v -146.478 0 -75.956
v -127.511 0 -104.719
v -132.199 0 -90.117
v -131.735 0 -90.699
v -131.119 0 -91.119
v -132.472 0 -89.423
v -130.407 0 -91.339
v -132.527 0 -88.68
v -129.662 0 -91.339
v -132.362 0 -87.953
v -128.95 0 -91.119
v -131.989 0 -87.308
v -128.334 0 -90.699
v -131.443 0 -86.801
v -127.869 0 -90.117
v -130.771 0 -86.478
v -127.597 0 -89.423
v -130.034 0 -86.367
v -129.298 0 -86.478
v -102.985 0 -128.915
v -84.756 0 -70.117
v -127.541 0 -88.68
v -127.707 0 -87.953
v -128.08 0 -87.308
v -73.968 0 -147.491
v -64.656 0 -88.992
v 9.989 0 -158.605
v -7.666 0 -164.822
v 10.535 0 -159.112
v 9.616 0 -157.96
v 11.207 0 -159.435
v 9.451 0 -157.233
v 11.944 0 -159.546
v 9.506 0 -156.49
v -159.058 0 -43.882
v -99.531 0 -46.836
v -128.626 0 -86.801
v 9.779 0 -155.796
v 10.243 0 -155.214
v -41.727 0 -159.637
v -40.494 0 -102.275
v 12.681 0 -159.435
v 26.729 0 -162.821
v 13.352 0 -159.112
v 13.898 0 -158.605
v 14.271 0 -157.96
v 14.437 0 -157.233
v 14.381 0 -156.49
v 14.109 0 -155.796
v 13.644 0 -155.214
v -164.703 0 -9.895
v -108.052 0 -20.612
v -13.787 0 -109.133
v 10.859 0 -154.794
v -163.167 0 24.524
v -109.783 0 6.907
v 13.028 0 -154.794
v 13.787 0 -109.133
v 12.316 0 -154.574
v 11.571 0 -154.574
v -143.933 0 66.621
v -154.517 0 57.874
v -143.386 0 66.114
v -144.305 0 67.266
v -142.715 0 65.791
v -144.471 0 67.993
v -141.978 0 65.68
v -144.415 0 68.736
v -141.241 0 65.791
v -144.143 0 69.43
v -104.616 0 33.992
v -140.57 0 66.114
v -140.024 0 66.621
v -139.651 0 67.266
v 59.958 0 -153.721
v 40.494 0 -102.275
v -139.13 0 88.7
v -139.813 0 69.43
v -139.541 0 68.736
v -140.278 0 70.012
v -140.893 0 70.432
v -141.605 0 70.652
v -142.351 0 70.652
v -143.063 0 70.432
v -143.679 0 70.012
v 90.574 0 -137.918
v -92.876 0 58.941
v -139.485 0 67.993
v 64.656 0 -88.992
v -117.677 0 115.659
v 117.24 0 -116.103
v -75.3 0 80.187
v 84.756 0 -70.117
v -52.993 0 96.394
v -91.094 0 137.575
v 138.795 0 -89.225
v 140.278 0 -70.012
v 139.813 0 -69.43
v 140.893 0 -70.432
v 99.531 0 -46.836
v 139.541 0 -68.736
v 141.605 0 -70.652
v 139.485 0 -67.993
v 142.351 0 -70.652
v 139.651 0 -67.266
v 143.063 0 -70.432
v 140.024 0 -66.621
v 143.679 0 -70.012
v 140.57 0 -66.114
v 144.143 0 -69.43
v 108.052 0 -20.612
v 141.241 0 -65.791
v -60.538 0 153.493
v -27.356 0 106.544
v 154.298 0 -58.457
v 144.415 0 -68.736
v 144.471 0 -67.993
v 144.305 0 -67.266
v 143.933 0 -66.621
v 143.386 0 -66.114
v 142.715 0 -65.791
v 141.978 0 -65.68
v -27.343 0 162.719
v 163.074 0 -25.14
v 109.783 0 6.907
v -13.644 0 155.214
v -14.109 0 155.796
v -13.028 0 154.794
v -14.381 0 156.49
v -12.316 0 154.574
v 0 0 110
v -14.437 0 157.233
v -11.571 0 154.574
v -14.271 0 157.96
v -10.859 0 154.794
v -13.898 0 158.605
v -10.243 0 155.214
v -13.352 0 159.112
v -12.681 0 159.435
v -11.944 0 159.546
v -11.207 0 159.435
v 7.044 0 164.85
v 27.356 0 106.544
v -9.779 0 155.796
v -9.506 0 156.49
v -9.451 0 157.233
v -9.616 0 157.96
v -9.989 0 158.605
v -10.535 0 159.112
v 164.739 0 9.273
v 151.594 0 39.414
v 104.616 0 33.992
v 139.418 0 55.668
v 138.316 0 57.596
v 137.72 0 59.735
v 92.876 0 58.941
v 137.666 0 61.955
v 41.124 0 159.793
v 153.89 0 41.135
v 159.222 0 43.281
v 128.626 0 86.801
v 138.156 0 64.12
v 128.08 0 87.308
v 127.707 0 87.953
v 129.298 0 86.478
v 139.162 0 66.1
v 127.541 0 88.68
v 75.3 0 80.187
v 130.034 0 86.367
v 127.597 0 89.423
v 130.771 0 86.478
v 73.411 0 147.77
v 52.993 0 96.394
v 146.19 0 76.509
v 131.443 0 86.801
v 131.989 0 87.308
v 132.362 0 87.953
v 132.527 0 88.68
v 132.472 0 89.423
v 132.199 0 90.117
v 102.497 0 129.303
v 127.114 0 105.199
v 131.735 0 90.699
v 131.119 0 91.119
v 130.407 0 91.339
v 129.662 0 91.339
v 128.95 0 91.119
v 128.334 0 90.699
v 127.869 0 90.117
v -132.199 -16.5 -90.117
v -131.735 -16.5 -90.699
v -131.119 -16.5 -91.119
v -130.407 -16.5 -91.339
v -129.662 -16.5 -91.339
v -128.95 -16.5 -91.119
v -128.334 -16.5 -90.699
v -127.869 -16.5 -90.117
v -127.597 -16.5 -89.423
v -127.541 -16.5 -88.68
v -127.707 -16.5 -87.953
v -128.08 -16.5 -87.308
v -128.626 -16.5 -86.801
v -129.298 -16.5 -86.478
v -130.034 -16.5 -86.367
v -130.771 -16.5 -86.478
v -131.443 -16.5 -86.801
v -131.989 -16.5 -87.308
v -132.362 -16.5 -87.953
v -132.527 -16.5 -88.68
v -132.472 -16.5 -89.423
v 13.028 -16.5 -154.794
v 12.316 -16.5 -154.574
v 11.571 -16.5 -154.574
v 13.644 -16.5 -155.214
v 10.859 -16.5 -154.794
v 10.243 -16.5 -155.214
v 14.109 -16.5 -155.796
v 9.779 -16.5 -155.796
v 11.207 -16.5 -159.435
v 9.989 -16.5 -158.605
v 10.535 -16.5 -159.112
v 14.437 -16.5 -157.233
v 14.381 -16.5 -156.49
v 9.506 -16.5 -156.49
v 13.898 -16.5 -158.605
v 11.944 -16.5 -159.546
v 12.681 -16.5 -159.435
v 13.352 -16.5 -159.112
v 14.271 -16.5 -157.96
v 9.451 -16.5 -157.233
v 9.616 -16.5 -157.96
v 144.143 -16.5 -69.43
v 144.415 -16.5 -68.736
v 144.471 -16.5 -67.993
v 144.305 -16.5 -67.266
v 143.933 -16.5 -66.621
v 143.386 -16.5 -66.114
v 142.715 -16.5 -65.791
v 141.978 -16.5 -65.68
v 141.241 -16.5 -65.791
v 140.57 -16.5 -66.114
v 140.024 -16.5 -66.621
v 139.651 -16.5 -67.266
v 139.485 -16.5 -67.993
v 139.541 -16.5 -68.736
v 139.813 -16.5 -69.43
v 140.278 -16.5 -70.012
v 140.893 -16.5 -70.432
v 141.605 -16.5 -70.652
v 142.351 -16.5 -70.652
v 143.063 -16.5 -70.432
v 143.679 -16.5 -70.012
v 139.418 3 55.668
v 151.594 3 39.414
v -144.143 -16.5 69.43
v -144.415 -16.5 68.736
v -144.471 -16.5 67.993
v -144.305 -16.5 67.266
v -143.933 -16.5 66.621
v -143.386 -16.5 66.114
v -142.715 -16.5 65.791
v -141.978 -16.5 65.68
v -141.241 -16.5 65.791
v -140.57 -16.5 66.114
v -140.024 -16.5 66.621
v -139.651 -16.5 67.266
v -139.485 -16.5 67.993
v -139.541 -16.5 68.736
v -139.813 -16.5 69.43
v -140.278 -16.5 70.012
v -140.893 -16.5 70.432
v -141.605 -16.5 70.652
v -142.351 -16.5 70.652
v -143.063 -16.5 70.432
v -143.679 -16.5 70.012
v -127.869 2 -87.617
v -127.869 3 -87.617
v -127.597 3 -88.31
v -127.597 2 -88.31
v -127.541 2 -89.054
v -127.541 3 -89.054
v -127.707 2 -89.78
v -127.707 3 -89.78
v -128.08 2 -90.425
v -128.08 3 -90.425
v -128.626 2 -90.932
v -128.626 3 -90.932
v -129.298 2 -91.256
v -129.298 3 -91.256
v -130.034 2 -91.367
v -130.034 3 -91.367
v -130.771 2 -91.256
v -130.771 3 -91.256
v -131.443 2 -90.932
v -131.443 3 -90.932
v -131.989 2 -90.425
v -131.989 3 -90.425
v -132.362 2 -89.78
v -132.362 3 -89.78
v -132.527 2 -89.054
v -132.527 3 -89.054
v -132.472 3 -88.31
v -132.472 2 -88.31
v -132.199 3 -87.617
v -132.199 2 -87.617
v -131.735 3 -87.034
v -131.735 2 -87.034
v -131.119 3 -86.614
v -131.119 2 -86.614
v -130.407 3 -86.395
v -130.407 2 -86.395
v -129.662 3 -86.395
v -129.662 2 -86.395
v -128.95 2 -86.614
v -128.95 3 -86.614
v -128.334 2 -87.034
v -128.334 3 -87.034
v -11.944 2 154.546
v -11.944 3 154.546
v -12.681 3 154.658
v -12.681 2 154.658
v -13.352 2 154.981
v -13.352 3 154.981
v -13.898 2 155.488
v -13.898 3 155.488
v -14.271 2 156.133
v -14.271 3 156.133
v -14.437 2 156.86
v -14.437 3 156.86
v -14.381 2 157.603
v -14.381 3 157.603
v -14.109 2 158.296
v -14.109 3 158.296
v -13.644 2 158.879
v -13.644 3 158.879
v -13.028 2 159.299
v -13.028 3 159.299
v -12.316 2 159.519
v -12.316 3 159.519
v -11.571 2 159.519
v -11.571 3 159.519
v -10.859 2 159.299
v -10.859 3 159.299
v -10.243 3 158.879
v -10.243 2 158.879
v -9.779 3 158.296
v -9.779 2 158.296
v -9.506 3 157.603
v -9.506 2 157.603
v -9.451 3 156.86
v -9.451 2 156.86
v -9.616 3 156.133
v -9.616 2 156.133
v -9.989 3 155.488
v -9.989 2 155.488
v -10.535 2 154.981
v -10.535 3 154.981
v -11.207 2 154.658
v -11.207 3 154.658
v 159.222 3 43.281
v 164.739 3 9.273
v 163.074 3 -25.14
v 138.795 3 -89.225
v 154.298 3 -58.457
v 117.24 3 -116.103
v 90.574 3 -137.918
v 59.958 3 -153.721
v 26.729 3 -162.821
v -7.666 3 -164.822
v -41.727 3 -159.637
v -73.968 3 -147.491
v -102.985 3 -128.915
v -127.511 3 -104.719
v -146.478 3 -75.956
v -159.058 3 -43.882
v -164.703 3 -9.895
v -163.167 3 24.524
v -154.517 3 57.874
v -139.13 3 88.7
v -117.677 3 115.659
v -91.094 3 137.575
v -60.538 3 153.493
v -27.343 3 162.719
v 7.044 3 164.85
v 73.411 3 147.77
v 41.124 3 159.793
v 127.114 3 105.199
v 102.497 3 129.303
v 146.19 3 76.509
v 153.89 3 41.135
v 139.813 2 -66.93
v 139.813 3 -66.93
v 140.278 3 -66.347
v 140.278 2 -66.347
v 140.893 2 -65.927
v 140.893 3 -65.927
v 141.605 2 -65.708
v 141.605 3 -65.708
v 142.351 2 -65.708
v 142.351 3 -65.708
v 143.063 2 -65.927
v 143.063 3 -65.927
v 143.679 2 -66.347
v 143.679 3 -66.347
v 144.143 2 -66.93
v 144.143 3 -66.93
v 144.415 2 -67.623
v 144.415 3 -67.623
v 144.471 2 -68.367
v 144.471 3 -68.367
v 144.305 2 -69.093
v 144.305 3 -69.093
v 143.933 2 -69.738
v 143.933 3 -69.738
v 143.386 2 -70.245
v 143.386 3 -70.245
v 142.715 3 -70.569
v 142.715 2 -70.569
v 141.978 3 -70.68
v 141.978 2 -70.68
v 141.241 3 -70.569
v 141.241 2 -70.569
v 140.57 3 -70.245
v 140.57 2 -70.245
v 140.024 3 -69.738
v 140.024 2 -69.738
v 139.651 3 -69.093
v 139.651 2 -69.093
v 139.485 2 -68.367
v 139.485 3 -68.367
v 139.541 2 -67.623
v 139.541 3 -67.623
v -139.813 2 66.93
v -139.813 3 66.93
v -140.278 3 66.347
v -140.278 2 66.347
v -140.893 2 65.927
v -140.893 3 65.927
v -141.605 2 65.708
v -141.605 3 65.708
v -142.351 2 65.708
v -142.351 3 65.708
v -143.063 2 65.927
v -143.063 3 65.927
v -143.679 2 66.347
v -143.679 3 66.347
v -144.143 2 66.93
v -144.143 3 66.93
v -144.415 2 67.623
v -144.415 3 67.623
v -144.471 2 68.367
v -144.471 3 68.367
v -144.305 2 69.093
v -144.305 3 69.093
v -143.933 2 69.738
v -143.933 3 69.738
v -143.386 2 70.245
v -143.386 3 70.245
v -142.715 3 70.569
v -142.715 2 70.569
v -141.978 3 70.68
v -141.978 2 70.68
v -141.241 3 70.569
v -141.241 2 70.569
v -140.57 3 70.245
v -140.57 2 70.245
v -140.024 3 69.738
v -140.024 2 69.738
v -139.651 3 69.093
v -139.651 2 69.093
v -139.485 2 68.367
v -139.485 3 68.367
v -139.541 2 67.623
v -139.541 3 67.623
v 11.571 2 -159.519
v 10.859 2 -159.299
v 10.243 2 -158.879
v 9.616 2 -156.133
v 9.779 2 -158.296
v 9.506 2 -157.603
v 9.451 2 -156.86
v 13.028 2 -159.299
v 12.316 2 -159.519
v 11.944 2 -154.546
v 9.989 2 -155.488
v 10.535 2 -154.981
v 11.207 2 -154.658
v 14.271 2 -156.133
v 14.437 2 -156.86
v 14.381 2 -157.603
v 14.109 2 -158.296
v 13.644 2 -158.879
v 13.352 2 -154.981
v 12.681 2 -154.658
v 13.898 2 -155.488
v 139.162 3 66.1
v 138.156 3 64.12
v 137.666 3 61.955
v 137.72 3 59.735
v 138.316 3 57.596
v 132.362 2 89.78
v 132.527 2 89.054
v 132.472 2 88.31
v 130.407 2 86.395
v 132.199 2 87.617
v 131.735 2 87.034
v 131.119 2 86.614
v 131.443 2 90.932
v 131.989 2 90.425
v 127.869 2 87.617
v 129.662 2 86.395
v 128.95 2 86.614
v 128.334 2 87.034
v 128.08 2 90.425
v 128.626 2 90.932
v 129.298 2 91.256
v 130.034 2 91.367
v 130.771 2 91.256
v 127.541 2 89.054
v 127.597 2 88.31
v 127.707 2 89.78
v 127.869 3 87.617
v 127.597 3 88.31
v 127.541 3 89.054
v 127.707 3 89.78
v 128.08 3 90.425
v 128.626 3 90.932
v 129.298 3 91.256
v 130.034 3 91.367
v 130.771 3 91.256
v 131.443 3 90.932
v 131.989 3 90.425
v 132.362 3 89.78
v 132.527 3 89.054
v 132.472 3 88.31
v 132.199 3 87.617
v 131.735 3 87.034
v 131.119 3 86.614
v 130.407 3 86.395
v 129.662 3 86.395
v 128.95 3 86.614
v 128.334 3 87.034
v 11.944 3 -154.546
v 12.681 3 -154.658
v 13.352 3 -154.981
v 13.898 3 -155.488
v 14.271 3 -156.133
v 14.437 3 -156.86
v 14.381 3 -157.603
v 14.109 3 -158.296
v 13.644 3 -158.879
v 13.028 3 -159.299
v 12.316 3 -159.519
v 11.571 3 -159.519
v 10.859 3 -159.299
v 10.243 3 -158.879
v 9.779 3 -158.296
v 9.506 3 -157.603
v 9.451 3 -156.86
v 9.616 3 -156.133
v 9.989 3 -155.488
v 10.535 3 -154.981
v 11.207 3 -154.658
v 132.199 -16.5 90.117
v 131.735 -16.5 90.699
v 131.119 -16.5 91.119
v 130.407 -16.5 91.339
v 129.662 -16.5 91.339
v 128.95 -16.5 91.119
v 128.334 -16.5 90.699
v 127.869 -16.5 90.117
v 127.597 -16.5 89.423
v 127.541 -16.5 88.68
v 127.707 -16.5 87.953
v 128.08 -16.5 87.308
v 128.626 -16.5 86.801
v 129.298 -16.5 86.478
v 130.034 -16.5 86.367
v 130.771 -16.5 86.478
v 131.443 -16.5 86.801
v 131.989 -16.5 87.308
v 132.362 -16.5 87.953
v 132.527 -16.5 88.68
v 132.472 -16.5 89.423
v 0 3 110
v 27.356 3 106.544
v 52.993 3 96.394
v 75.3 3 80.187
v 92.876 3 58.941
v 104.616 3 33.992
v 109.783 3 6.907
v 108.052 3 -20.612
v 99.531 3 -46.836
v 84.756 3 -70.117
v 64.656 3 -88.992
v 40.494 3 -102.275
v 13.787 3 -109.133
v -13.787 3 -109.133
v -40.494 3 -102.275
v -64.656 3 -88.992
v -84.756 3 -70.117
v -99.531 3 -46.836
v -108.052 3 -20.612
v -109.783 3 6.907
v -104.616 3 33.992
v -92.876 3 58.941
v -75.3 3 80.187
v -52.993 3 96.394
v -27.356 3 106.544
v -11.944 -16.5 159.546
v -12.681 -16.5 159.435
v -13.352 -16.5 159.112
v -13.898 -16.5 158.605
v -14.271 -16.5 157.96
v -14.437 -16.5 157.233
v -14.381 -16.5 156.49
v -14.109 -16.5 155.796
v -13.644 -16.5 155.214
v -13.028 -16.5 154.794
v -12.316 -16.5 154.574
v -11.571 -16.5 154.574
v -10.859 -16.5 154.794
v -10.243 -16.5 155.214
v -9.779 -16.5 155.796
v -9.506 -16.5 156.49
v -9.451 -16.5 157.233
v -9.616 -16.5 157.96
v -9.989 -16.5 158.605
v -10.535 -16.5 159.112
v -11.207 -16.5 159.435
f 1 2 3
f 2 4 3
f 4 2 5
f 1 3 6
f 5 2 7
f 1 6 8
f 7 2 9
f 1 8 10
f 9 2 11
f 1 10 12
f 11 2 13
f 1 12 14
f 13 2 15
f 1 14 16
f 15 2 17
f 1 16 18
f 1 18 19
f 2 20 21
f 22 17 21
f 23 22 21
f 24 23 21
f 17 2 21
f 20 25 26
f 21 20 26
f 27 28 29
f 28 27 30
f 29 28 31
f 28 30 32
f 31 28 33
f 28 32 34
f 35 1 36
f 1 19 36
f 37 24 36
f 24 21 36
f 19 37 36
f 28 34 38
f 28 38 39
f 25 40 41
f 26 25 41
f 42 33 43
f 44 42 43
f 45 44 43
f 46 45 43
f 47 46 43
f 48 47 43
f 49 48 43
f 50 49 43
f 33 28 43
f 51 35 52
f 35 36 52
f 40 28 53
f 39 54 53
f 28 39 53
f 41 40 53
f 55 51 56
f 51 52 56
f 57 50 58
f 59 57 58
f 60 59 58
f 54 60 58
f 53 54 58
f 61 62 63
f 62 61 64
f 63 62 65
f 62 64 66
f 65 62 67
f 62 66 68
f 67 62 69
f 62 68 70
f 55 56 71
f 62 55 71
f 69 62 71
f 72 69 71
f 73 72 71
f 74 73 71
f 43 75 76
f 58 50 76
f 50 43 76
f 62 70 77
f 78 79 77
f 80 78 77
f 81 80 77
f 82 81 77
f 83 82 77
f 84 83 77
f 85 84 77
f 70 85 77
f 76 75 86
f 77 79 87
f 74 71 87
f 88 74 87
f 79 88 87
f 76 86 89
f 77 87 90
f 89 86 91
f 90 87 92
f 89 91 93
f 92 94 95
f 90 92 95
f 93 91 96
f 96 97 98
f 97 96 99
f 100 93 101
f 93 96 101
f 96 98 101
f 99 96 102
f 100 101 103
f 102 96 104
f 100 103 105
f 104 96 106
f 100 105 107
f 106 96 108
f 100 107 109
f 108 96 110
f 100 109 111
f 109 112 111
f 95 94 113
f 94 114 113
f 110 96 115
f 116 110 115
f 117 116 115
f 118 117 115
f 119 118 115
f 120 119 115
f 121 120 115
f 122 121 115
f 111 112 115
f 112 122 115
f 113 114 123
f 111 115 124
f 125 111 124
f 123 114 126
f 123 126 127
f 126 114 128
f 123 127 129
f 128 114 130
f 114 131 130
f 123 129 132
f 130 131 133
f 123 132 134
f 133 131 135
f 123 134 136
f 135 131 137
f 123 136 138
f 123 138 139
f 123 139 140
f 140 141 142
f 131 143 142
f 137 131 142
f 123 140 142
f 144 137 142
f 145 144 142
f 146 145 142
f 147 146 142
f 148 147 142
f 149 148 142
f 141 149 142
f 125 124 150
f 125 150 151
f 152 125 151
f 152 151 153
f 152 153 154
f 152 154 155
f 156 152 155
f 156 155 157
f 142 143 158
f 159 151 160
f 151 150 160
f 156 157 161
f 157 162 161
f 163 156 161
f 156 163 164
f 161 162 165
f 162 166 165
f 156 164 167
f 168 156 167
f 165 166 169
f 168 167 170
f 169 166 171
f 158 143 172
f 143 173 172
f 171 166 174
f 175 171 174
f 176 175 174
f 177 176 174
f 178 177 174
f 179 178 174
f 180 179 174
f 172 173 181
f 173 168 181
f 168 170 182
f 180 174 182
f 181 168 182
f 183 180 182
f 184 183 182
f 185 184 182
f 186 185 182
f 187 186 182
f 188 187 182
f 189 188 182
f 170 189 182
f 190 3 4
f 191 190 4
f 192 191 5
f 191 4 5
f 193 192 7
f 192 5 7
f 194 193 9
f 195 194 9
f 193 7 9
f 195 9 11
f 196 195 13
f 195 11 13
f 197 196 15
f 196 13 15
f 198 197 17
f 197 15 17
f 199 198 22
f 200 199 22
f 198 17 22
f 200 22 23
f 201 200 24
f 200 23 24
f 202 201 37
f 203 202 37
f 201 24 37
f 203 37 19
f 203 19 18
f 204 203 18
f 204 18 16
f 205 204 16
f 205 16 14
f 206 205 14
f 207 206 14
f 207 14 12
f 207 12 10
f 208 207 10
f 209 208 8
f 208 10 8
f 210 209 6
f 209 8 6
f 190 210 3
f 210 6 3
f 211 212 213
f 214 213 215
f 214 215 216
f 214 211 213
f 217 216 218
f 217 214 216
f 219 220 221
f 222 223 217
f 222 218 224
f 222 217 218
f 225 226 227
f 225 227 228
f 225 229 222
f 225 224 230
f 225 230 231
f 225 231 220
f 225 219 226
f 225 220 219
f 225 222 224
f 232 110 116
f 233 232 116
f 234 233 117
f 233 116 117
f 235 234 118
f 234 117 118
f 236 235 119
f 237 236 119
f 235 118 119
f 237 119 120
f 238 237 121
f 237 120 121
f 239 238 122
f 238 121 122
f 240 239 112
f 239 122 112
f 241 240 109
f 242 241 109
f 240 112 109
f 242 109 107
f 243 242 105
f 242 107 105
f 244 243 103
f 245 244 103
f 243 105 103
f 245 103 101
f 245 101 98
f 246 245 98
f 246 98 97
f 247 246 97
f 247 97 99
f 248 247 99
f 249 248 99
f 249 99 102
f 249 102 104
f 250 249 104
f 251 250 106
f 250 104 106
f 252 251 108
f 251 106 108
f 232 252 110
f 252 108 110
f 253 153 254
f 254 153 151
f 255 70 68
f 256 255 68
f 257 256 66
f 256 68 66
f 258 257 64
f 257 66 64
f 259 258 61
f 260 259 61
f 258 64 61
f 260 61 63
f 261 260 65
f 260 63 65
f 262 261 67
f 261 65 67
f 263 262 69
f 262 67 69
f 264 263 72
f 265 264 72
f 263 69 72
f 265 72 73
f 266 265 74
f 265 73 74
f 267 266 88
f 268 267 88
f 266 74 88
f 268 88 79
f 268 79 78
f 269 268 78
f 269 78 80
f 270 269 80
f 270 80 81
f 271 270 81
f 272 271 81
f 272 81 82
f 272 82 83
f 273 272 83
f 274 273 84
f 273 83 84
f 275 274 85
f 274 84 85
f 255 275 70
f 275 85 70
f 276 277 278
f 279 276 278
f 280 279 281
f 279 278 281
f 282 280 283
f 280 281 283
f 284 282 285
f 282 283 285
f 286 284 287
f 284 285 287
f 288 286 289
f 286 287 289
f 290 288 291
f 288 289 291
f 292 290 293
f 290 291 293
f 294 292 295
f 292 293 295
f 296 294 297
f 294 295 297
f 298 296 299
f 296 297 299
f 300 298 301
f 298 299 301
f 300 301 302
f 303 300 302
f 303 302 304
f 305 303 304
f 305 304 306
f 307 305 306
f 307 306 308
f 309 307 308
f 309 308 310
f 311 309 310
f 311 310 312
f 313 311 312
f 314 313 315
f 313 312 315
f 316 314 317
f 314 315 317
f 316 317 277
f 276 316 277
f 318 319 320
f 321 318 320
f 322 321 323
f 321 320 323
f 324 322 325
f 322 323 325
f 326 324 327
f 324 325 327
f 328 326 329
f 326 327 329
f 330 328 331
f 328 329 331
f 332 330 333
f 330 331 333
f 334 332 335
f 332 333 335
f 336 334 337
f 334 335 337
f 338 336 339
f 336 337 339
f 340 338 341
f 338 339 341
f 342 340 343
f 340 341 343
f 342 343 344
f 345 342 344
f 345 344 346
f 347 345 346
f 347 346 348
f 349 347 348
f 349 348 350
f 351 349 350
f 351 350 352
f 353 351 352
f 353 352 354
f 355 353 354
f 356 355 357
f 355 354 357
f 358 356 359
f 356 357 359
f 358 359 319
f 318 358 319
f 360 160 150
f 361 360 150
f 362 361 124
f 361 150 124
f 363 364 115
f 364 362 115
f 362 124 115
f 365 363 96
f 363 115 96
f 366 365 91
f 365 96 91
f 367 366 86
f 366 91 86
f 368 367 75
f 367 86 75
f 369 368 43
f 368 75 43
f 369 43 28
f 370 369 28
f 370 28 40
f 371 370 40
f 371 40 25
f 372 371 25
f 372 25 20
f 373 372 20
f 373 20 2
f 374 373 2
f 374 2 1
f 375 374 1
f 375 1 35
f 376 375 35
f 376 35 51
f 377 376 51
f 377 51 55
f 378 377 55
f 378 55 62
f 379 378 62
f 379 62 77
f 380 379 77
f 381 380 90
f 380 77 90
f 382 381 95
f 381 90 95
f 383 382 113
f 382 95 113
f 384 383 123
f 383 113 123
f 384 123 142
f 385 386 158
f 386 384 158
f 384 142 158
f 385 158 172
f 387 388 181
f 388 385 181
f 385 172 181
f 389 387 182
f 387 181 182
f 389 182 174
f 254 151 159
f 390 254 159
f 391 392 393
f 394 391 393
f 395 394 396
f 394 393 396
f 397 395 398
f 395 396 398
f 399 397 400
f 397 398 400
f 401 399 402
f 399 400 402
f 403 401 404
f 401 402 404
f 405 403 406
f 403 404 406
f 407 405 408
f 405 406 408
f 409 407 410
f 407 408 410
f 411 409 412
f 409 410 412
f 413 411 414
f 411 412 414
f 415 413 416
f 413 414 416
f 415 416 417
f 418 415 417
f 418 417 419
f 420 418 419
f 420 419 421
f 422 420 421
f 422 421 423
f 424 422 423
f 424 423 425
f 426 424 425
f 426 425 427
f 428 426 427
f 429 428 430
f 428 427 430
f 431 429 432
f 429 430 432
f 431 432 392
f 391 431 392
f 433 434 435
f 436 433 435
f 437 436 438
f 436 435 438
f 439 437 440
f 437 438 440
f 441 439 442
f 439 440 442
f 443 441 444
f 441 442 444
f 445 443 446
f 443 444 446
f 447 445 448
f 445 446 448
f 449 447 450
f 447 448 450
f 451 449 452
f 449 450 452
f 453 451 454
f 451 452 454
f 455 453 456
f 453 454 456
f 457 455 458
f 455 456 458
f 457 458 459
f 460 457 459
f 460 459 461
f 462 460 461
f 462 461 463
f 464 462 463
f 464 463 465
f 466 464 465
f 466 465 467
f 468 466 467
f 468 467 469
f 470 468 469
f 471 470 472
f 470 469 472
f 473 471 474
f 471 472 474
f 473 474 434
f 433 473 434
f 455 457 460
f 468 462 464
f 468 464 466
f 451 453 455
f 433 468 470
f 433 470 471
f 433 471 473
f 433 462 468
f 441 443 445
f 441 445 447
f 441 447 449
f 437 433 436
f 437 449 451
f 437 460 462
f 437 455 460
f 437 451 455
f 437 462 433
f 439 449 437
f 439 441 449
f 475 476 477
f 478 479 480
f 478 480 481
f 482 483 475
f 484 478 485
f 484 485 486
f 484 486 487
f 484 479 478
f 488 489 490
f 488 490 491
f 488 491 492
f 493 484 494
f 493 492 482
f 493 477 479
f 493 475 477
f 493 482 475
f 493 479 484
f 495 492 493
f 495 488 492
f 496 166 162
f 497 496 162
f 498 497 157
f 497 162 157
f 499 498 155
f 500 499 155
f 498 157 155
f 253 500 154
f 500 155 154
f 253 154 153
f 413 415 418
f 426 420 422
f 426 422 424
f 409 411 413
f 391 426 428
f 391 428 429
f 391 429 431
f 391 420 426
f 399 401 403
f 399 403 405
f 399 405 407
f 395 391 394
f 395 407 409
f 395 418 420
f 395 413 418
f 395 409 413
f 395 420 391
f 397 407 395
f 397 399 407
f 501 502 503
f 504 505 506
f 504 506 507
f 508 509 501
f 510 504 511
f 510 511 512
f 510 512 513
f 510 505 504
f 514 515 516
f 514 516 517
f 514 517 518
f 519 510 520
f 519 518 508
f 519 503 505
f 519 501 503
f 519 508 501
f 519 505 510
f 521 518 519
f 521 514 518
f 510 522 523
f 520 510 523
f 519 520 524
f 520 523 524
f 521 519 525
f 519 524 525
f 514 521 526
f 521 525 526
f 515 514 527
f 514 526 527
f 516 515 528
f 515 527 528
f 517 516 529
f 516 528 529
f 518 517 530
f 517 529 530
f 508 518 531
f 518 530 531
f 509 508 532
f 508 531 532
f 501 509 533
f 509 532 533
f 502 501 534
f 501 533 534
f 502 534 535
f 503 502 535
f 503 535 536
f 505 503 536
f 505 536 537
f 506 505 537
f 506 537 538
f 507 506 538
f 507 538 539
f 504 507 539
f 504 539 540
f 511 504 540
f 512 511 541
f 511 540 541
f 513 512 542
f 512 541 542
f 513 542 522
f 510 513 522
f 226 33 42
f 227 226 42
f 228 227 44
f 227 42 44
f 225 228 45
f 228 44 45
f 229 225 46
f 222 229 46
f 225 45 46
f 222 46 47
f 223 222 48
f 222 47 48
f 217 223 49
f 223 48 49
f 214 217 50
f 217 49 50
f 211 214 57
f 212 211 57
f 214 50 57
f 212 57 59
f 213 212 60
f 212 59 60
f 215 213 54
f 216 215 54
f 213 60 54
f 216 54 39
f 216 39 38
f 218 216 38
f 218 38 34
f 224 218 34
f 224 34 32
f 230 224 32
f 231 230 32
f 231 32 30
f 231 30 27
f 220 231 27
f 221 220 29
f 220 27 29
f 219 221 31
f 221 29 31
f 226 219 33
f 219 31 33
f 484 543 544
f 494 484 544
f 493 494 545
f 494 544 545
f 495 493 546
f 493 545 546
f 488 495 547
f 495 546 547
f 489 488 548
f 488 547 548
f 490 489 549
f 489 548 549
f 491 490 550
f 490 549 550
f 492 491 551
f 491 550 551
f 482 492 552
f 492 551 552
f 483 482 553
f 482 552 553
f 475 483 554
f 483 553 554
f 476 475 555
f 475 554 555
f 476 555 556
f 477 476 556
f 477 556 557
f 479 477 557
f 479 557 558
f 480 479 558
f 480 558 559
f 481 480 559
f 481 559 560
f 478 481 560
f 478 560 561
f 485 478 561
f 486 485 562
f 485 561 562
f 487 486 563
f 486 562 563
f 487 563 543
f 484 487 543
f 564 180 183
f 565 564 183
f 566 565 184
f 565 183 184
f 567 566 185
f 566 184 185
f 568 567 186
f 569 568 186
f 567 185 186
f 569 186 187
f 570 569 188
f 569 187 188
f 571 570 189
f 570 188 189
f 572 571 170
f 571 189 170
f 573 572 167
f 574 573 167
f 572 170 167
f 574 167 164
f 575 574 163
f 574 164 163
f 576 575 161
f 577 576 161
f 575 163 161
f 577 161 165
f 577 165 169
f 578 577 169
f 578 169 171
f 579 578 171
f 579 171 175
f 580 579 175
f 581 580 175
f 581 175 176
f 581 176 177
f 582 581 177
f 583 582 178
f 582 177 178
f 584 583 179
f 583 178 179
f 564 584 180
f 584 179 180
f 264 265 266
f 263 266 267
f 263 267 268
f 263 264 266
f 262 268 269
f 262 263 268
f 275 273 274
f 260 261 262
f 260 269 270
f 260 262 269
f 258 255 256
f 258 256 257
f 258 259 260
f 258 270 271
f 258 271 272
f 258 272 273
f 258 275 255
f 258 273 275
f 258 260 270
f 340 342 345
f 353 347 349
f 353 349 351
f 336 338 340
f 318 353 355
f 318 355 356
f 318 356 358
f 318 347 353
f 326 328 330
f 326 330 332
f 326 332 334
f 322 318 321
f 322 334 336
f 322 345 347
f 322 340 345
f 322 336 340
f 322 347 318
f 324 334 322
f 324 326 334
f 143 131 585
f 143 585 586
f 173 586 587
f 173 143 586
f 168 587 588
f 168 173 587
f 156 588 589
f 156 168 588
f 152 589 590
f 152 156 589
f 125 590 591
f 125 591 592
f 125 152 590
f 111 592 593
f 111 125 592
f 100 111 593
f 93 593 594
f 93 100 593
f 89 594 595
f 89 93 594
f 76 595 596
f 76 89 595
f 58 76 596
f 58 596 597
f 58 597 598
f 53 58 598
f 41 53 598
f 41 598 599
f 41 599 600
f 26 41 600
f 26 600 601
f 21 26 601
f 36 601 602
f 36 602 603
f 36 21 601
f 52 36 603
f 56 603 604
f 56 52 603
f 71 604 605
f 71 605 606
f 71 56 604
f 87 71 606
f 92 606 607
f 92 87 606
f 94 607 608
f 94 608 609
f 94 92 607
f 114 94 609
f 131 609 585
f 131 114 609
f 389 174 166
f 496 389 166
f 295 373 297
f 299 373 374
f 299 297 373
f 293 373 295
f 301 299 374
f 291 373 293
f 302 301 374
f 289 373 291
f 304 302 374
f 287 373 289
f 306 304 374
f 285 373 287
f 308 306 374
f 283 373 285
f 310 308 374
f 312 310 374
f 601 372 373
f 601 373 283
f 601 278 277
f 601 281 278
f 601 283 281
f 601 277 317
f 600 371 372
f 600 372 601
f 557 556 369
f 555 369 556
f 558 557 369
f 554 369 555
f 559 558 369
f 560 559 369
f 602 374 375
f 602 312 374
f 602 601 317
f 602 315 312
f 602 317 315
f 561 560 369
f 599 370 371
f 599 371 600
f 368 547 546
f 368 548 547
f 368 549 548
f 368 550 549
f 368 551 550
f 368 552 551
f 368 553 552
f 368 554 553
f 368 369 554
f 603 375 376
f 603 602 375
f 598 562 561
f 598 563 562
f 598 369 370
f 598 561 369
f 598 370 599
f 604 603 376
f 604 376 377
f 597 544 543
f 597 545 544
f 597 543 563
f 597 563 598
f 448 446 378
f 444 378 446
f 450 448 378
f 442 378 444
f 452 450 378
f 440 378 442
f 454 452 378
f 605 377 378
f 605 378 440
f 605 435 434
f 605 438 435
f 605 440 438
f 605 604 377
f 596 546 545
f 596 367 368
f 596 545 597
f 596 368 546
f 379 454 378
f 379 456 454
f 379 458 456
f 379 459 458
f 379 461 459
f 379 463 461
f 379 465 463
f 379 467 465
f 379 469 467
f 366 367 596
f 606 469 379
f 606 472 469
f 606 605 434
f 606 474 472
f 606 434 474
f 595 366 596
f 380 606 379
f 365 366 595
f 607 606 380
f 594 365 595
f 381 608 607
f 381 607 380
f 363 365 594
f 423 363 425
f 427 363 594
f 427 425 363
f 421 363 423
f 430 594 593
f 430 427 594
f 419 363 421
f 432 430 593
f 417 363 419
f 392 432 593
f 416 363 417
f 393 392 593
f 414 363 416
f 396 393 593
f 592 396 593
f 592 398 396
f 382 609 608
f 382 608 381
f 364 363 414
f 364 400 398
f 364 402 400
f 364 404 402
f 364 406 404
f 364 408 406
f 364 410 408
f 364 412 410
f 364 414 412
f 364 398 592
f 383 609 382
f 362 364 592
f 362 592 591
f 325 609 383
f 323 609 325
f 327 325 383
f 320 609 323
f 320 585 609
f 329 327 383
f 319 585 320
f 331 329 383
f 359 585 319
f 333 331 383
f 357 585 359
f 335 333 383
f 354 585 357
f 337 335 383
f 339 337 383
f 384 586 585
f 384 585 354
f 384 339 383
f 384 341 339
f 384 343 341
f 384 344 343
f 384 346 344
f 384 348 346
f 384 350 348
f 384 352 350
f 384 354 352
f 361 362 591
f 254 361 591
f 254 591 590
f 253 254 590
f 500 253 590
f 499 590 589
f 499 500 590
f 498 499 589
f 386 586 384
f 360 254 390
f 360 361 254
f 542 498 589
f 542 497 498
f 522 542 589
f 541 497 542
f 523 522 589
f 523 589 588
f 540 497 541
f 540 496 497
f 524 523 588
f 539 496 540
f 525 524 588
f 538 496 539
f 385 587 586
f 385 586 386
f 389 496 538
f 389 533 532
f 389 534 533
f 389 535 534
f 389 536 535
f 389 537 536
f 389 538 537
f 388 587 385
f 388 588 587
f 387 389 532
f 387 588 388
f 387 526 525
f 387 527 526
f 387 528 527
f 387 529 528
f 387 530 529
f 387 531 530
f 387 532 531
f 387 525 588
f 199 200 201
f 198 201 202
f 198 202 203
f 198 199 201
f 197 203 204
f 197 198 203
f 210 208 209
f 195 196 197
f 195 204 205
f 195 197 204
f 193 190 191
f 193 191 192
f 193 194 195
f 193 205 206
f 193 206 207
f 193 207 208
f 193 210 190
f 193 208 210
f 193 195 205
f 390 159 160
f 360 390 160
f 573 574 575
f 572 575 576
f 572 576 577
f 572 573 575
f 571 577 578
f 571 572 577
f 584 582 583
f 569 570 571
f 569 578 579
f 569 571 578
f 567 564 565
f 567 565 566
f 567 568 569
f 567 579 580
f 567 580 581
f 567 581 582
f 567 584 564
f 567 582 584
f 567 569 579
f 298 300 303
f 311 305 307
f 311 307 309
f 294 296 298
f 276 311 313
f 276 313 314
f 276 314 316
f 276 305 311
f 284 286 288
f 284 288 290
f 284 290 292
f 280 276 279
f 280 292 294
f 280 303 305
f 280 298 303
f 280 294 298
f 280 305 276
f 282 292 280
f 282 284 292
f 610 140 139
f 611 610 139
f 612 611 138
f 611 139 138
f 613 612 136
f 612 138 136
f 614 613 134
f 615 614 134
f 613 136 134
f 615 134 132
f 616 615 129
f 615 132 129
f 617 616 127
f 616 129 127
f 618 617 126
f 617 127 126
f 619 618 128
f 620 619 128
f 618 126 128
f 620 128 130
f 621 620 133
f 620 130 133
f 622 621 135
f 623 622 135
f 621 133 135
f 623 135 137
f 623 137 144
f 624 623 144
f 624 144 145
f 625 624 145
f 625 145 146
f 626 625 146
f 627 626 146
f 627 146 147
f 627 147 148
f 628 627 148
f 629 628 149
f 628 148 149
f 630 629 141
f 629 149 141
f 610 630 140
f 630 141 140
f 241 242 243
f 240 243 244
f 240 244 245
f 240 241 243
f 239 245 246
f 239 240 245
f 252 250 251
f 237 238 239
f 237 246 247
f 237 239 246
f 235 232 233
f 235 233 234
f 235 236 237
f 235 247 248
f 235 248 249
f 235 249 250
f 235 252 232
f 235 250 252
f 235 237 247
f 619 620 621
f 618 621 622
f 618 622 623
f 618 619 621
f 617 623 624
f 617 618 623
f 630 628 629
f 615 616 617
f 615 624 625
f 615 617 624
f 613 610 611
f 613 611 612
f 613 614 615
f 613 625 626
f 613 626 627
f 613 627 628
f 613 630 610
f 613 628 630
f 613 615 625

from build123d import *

# Parameters (mm, degrees)
SKETCH1_R           = 165
SKETCH1_R_2         = 110
BOSS_EXTRUDE1_DEPTH = 3
SKETCH4_R           = 2.5
BOSS_EXTRUDE2_DEPTH = 16.5
CIRPATTERN1_COUNT   = 6
CUT_EXTRUDE1_DEPTH  = 10
SKETCH6_R           = 2.5
CUT_EXTRUDE2_DEPTH  = 1
CIRPATTERN5_COUNT   = 6


with BuildPart() as part:
    # Sketch1 → Boss-Extrude1 (new body)
    with BuildSketch(Plane(origin=(0, 0, 0), x_dir=(1, 0, 0), z_dir=(0, 1, 0))):
        with Locations(Location((0, 0, 0), (0, 0, 270))):
            Circle(SKETCH1_R)
        with Locations(Location((0, 0, 0), (0, 0, 270))):
            Circle(SKETCH1_R_2, mode=Mode.SUBTRACT)
    extrude(amount=BOSS_EXTRUDE1_DEPTH)

    # Sketch4 → Boss-Extrude2 (add)
    with BuildSketch(Plane.XZ):
        with Locations(Location((-11.943664818, 157.046486337, 0), (0, 0, 90))):
            Circle(SKETCH4_R)
    boss_extrude2 = extrude(amount=BOSS_EXTRUDE2_DEPTH)

    # CirPattern1: Boss-Extrude2 ×6 about axis
    cirpattern1_axis = Axis((0, 0, 0), (0, 1, 0))
    for i in range(1, CIRPATTERN1_COUNT):
        add(boss_extrude2.rotate(cirpattern1_axis, i * 360 / CIRPATTERN1_COUNT))

    # Sketch5 → Cut-Extrude1 (cut)
    with BuildSketch(Plane(origin=(0, 0, 0), x_dir=(-1, 0, 0), z_dir=(0, -1, 0))):
        with BuildLine():
            Line((-139.418207286, -55.668125577), (-151.59368138, -39.414458013))
            Line((-151.59368138, -39.414458013), (-153.890000313, -41.134609577))
            Line((-153.890000313, -41.134609577), (-160.156367767, -43.657048272))
            ThreePointArc((-160.156367767, -43.657048272), (-154.417811813, -60.91912175), (-146.824907269, -77.449639157))
            Line((-146.824907269, -77.449639157), (-139.16221183, -66.09993074))
            ThreePointArc((-139.16221183, -66.09993074), (-137.624058072, -60.843140968), (-139.418207286, -55.668125577))
        make_face()
    extrude(amount=-CUT_EXTRUDE1_DEPTH, mode=Mode.SUBTRACT)

    # Sketch6 → Cut-Extrude2 (cut)
    with BuildSketch(Plane(origin=(0, 3, 0), x_dir=(1, 0, 0), z_dir=(0, 1, 0))):
        with Locations(Location((11.943664818, 157.046486337, 0), (0, 0, 270))):
            Circle(SKETCH6_R)
    cut_extrude2 = extrude(amount=-CUT_EXTRUDE2_DEPTH, mode=Mode.SUBTRACT)

    # CirPattern5: Cut-Extrude2 ×6 about axis
    cirpattern5_axis = Axis((0, 0, 0), (0, 1, 0))
    for i in range(1, CIRPATTERN5_COUNT):
        add(cut_extrude2.rotate(cirpattern5_axis, i * 360 / CIRPATTERN5_COUNT), mode=Mode.SUBTRACT)


solid = part.part
